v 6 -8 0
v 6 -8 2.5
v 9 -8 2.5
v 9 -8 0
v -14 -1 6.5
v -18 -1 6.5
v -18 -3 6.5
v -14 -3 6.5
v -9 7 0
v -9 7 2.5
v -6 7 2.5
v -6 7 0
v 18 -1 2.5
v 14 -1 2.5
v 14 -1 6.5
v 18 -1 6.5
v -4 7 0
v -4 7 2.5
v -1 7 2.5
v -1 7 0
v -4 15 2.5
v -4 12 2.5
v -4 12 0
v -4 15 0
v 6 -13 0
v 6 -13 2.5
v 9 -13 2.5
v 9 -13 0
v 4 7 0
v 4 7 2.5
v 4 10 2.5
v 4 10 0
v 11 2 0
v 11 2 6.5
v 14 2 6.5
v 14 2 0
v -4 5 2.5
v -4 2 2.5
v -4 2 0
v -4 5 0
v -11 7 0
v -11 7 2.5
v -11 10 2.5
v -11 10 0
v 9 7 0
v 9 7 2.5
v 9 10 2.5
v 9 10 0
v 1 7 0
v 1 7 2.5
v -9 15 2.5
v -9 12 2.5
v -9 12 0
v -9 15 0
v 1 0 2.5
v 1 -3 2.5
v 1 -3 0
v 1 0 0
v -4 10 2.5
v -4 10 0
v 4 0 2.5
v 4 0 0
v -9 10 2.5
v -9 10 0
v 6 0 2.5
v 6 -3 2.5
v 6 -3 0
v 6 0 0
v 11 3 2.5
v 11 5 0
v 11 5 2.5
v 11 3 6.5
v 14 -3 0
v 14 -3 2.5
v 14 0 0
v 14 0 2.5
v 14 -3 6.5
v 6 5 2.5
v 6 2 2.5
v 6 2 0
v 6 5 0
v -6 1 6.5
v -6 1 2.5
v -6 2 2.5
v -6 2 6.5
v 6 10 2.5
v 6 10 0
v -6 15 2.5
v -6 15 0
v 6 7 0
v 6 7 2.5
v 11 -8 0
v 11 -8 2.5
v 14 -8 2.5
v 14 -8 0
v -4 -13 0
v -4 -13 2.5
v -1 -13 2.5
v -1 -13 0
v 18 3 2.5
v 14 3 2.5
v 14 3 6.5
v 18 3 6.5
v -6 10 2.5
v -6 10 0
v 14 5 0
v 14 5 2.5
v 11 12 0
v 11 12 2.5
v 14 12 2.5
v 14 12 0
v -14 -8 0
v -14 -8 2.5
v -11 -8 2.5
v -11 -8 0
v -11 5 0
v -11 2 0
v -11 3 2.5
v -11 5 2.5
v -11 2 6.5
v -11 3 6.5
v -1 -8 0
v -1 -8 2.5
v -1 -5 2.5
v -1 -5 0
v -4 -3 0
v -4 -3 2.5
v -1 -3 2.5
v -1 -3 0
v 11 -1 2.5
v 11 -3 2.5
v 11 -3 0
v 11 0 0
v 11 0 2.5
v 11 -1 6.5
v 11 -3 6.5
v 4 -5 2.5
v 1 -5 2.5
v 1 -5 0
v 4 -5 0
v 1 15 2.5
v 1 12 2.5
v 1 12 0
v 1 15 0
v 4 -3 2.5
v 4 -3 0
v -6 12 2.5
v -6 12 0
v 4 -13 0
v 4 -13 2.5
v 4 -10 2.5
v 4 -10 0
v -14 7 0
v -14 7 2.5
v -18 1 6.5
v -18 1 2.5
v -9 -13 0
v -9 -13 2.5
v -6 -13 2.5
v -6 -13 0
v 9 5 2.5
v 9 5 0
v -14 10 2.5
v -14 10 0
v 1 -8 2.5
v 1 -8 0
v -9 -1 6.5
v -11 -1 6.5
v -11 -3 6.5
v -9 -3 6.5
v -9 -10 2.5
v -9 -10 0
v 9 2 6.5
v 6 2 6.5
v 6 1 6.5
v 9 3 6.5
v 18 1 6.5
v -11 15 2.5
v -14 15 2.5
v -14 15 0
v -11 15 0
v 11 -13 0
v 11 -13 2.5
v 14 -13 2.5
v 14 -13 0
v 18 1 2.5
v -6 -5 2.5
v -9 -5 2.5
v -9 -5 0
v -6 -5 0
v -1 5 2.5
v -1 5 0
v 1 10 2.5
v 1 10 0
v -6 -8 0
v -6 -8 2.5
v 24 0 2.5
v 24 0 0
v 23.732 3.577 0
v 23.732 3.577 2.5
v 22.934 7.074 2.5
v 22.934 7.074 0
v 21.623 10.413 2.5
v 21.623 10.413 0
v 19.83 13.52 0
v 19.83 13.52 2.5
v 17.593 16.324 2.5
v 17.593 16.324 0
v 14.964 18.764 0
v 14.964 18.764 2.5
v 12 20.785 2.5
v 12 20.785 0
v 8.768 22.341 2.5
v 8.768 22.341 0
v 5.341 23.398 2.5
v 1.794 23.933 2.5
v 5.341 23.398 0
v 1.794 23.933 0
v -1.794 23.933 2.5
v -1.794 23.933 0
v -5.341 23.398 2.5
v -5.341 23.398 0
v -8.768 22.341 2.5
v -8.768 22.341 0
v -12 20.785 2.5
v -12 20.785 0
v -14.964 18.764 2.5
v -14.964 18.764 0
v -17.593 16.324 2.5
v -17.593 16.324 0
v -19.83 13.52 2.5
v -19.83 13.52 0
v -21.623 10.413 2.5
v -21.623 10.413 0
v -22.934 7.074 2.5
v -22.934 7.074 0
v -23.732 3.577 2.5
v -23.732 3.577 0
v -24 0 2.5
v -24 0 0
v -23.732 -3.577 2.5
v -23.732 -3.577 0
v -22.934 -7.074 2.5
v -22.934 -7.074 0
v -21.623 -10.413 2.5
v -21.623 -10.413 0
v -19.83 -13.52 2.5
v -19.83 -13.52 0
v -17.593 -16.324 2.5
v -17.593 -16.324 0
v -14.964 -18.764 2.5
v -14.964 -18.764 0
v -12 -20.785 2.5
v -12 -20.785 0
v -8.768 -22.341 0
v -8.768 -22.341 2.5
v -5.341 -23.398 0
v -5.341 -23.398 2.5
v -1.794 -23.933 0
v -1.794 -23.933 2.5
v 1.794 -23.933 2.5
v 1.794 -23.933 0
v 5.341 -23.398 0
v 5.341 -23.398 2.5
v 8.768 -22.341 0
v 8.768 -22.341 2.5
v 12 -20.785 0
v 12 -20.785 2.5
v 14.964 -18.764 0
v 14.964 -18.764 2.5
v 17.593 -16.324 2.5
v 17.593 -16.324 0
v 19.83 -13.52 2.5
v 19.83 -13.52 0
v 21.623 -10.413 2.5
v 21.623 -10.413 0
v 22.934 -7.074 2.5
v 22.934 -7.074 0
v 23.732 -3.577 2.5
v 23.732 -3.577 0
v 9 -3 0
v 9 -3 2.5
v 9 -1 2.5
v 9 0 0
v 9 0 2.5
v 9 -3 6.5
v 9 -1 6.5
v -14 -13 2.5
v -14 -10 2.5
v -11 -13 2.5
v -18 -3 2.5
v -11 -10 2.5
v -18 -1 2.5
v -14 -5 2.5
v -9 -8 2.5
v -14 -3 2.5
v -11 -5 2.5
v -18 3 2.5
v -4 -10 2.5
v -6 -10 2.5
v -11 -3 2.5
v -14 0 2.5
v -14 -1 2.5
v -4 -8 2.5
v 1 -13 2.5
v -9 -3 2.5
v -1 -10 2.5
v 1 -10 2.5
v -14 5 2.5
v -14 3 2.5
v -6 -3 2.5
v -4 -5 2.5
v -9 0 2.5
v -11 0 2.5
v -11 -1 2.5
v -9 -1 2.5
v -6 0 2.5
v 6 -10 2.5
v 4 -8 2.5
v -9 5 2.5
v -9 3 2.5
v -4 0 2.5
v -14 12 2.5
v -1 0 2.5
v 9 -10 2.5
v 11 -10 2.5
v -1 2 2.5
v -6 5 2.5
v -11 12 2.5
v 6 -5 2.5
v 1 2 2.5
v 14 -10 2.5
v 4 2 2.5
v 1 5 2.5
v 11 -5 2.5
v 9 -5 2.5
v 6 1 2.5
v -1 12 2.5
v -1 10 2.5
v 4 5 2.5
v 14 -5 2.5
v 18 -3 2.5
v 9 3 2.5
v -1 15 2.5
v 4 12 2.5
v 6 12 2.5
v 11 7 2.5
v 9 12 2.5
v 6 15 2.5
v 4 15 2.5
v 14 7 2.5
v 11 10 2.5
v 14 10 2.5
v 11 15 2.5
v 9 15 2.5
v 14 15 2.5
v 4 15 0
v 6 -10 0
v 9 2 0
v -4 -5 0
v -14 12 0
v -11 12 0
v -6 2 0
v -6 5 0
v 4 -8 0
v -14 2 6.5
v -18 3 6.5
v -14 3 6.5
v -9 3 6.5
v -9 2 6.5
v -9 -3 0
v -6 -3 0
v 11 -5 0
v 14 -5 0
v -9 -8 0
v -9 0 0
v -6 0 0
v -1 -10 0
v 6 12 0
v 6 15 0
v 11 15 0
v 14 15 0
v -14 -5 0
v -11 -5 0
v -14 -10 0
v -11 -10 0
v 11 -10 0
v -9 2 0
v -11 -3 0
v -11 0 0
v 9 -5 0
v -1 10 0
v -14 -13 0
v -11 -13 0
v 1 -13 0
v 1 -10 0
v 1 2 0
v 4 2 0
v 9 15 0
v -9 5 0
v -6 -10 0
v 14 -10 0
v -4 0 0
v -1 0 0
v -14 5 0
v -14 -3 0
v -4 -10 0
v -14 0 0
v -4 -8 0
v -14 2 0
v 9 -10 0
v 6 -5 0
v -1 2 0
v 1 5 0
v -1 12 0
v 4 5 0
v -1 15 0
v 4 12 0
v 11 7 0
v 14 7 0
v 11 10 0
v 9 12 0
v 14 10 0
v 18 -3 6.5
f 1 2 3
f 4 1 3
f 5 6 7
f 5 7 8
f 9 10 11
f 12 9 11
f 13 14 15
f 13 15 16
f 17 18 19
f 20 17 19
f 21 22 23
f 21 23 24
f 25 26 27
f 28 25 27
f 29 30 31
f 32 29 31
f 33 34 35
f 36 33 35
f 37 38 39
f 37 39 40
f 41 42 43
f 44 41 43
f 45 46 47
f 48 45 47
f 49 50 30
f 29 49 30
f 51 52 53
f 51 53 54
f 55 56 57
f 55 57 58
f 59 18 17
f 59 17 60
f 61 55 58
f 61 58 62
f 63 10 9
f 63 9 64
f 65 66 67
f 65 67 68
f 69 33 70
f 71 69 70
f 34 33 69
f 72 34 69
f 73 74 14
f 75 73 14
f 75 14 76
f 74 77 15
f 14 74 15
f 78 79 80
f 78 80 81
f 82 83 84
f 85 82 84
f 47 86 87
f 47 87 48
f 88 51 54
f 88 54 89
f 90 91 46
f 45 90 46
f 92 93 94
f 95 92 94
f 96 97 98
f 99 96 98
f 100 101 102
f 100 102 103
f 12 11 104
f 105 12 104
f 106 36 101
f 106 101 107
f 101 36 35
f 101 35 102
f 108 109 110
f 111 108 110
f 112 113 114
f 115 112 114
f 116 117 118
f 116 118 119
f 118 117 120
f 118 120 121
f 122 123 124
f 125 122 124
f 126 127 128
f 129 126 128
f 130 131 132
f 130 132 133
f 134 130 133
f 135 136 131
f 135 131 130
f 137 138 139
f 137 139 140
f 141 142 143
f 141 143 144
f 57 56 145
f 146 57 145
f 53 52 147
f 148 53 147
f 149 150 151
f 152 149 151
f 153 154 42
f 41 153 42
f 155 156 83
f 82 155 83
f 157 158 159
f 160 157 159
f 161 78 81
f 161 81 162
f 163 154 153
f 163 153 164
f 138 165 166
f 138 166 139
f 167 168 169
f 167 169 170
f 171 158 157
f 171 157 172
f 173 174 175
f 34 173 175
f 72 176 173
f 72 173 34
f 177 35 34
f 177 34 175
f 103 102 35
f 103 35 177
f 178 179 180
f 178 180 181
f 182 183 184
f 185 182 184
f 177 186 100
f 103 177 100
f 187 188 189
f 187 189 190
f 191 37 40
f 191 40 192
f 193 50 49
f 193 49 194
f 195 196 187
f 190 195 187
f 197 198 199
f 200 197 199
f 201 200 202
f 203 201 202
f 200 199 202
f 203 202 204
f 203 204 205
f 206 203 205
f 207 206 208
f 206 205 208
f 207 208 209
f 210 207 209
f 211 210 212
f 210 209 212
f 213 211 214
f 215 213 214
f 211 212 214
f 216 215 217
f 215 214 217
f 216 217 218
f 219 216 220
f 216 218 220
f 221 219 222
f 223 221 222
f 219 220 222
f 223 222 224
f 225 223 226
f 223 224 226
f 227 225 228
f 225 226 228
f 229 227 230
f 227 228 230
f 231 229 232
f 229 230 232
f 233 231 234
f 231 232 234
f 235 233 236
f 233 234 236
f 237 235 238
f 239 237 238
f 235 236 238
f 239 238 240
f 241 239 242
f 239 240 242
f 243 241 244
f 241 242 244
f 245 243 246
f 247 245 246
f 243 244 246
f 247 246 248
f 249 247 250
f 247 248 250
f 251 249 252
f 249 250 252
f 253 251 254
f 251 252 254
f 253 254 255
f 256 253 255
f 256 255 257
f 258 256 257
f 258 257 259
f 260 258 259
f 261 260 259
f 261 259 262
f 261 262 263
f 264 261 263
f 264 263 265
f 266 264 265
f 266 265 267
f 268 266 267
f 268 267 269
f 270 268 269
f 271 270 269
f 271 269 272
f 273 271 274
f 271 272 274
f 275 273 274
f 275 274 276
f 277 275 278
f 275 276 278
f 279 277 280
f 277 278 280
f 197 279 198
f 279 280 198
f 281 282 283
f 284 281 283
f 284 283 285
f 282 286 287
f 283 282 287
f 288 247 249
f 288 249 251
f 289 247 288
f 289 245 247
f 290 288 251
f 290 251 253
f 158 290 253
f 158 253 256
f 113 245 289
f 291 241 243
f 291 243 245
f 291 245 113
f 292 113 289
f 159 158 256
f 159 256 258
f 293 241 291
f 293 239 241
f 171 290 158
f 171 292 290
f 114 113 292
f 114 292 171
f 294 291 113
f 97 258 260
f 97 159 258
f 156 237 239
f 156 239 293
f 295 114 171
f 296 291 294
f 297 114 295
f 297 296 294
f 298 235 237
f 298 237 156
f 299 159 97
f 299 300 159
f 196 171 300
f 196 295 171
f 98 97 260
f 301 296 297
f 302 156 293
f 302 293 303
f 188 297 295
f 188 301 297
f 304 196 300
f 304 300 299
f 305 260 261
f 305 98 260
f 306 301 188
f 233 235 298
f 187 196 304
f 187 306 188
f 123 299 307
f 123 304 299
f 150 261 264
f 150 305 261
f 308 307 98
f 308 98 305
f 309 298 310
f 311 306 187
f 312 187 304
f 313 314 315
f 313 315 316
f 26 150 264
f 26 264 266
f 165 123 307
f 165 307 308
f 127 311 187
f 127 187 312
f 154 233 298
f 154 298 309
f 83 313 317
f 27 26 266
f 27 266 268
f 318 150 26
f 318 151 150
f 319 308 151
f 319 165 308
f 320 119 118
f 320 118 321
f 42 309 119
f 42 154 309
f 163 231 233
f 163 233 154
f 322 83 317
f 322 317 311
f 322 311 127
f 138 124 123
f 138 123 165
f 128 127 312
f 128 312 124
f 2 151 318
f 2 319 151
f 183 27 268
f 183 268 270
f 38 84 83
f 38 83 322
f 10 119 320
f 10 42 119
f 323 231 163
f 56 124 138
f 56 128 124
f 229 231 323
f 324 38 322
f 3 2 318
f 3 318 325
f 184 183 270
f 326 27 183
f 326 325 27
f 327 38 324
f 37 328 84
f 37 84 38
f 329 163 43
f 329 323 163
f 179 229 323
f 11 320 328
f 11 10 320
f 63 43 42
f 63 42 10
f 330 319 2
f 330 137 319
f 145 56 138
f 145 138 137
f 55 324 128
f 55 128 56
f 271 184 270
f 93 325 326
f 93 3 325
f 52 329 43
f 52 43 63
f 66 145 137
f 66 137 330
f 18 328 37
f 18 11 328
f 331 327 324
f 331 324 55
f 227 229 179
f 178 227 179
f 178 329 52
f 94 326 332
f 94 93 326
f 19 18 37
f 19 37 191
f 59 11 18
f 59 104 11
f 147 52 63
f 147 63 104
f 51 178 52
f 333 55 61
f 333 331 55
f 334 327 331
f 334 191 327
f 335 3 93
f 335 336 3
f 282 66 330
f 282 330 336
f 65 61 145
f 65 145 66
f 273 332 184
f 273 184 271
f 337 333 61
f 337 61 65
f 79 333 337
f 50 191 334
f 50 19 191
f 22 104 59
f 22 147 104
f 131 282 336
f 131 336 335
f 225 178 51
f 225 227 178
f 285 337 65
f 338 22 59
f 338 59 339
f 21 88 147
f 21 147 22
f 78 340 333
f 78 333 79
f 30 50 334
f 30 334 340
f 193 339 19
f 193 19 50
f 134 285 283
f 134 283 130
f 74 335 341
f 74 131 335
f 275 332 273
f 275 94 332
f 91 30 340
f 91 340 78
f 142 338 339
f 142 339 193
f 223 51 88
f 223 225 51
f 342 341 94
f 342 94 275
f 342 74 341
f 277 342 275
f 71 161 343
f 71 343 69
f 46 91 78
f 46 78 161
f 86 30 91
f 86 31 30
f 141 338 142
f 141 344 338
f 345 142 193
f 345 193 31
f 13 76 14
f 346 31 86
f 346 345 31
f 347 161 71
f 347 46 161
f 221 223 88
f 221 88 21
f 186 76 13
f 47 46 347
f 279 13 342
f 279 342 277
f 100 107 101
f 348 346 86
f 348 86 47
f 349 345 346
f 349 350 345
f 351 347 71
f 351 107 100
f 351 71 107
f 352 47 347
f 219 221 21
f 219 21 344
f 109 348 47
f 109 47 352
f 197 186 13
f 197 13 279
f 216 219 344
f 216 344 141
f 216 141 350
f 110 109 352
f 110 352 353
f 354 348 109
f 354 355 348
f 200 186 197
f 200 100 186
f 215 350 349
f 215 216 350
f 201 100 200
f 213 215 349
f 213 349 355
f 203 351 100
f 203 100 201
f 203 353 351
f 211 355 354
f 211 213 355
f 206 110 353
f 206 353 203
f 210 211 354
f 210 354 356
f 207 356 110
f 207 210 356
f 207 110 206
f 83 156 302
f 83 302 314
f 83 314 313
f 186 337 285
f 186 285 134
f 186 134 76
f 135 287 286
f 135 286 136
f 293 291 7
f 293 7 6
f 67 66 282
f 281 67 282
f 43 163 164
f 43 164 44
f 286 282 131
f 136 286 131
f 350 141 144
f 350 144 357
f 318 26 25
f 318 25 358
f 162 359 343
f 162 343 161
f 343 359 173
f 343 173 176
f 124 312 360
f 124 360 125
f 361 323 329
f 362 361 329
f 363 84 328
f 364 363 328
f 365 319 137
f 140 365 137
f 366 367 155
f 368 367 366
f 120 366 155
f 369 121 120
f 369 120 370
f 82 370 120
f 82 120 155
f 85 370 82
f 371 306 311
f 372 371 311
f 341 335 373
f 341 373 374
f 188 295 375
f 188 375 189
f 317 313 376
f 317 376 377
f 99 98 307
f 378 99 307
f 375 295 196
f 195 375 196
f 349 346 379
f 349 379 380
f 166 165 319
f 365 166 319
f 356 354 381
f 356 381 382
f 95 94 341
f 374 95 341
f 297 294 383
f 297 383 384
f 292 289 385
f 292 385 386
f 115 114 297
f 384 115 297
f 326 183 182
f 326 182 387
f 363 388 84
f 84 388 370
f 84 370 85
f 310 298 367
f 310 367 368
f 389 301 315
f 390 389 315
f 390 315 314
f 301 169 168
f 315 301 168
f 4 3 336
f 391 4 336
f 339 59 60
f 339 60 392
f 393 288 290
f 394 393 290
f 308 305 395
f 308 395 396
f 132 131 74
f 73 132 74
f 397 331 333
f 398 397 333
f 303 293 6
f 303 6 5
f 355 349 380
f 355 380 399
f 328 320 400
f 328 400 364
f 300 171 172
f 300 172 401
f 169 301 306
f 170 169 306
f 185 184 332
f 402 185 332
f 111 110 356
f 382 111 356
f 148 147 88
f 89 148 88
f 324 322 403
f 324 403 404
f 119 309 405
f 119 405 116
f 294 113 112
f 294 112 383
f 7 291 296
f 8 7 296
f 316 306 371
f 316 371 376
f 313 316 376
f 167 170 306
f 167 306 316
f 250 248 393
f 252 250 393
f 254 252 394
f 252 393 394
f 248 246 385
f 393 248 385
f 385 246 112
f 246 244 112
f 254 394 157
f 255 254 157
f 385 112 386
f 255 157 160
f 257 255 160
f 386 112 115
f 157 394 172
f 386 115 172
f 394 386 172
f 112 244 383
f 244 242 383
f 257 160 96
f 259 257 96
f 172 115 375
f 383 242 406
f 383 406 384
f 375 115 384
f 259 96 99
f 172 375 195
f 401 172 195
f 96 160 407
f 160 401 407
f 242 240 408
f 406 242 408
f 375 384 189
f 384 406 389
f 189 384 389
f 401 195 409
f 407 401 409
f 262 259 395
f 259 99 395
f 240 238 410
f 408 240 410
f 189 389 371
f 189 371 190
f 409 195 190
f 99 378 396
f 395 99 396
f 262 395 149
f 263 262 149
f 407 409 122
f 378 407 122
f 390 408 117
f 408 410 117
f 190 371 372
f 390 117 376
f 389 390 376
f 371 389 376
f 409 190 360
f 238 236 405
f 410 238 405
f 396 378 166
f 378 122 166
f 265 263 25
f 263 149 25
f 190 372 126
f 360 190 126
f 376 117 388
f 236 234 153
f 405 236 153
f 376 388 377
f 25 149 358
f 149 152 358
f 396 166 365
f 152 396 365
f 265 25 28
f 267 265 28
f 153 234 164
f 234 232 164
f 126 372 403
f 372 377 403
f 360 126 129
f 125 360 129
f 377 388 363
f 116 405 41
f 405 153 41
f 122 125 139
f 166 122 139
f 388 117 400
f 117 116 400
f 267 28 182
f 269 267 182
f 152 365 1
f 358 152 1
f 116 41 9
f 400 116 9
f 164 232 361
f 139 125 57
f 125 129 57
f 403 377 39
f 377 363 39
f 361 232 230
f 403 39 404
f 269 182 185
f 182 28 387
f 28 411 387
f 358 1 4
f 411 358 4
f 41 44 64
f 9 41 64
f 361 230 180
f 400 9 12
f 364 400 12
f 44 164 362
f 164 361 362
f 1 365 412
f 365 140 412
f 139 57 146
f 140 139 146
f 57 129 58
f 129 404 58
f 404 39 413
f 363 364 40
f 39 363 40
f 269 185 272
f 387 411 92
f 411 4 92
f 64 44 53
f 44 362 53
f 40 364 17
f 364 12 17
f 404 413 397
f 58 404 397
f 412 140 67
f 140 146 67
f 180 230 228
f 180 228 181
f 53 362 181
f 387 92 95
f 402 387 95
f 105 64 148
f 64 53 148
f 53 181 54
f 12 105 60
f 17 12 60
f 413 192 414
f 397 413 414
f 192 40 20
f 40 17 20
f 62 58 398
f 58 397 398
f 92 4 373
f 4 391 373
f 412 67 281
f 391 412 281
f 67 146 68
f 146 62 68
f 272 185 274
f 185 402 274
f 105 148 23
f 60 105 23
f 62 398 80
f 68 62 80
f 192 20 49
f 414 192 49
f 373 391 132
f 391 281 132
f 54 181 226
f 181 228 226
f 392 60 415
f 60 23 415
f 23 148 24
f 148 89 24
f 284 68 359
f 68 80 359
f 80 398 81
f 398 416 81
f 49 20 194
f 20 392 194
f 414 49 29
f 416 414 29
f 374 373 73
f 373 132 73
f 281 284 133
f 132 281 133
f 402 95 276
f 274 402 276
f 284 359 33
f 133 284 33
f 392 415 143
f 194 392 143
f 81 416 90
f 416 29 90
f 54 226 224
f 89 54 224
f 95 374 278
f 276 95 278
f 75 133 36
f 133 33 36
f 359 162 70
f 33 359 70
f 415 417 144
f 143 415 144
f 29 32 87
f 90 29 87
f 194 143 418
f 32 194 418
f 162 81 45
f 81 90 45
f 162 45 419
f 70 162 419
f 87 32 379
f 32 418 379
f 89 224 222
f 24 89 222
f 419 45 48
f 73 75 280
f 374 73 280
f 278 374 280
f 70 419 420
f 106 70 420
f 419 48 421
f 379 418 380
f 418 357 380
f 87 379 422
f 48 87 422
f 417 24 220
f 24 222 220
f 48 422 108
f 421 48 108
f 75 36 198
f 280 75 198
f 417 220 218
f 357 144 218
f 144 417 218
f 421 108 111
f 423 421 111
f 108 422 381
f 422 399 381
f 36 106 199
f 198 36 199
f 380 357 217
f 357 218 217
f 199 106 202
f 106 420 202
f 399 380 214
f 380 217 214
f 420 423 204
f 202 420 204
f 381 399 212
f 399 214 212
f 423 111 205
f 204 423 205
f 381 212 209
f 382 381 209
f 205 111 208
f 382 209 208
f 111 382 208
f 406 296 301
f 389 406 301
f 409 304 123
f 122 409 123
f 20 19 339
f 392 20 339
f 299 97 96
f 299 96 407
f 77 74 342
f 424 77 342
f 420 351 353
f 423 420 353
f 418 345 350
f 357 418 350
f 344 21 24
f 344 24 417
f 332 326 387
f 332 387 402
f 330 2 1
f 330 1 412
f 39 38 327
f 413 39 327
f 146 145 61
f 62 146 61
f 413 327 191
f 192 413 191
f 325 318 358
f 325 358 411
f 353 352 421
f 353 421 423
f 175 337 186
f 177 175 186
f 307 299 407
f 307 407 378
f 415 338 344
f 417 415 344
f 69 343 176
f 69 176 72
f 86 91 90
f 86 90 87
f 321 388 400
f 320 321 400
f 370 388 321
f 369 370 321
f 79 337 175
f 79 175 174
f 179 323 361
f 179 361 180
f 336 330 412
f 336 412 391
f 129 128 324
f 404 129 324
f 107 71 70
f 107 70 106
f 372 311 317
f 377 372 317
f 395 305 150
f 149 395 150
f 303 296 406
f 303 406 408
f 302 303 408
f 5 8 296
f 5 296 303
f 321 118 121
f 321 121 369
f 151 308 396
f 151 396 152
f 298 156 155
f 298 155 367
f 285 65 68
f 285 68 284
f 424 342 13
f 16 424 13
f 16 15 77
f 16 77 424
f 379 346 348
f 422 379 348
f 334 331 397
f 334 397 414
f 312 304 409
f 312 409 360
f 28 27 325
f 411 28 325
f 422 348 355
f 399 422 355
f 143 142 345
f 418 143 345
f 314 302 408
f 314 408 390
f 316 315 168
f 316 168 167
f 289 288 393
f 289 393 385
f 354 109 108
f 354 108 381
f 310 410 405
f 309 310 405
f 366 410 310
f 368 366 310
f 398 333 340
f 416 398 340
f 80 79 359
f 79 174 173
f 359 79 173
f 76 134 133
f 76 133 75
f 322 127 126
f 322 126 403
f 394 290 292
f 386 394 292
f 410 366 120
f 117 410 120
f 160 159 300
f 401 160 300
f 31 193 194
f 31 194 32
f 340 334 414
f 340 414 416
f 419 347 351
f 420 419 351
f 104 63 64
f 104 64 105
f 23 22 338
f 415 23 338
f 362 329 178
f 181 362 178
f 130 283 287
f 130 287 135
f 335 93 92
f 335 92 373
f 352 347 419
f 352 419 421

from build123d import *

# Parameters (mm, degrees)
F0_R          = 24
F1_DEPTH      = 2.5
F4_W          = 12
F4_H          = 2
F5_DEPTH      = 4
F6_W          = 3
F6_H          = 3
F7_DEPTH      = 2.5
F7_DEPTH_BACK = 25


with BuildPart() as f1:
    # F0 (on Top) → F1 (new body)
    with BuildSketch(Plane.XY):
        Circle(F0_R)
    extrude(amount=F1_DEPTH)

    # F4 (on face) → F5 (join)
    with BuildSketch(Plane.XY.offset(2.5)):
        with Locations((12, -2)):
            Rectangle(F4_W, F4_H)
        with Locations((12, 2)):
            Rectangle(F4_W, F4_H)
        with Locations((-12, -2)):
            Rectangle(F4_W, F4_H)
        with Locations((-12, 2)):
            Rectangle(F4_W, F4_H)
    extrude(amount=F5_DEPTH)

    # F6 (on face) → F7 (cut, two sides)
    with BuildSketch(Plane.XY.offset(2.5)) as f7_sk:
        with Locations((12.5, -11.5)):
            Rectangle(F6_W, F6_H)
        with Locations((12.5, -6.5)):
            Rectangle(F6_W, F6_H)
        with Locations((12.5, -1.5)):
            Rectangle(F6_W, F6_H)
        with Locations((12.5, 3.5)):
            Rectangle(F6_W, F6_H)
        with Locations((12.5, 8.5)):
            Rectangle(F6_W, F6_H)
        with Locations((12.5, 13.5)):
            Rectangle(F6_W, F6_H)
        with Locations((7.5, -11.5)):
            Rectangle(F6_W, F6_H)
        with Locations((7.5, -6.5)):
            Rectangle(F6_W, F6_H)
        with Locations((7.5, -1.5)):
            Rectangle(F6_W, F6_H)
        with Locations((7.5, 3.5)):
            Rectangle(F6_W, F6_H)
        with Locations((7.5, 8.5)):
            Rectangle(F6_W, F6_H)
        with Locations((7.5, 13.5)):
            Rectangle(F6_W, F6_H)
        with Locations((2.5, -11.5)):
            Rectangle(F6_W, F6_H)
        with Locations((2.5, -6.5)):
            Rectangle(F6_W, F6_H)
        with Locations((2.5, -1.5)):
            Rectangle(F6_W, F6_H)
        with Locations((2.5, 3.5)):
            Rectangle(F6_W, F6_H)
        with Locations((2.5, 8.5)):
            Rectangle(F6_W, F6_H)
        with Locations((2.5, 13.5)):
            Rectangle(F6_W, F6_H)
        with Locations((-2.5, -11.5)):
            Rectangle(F6_W, F6_H)
        with Locations((-2.5, -6.5)):
            Rectangle(F6_W, F6_H)
        with Locations((-2.5, -1.5)):
            Rectangle(F6_W, F6_H)
        with Locations((-2.5, 3.5)):
            Rectangle(F6_W, F6_H)
        with Locations((-2.5, 8.5)):
            Rectangle(F6_W, F6_H)
        with Locations((-2.5, 13.5)):
            Rectangle(F6_W, F6_H)
        with Locations((-7.5, -11.5)):
            Rectangle(F6_W, F6_H)
        with Locations((-7.5, -6.5)):
            Rectangle(F6_W, F6_H)
        with Locations((-7.5, -1.5)):
            Rectangle(F6_W, F6_H)
        with Locations((-7.5, 3.5)):
            Rectangle(F6_W, F6_H)
        with Locations((-7.5, 8.5)):
            Rectangle(F6_W, F6_H)
        with Locations((-7.5, 13.5)):
            Rectangle(F6_W, F6_H)
        with Locations((-12.5, -11.5)):
            Rectangle(F6_W, F6_H)
        with Locations((-12.5, -6.5)):
            Rectangle(F6_W, F6_H)
        with Locations((-12.5, -1.5)):
            Rectangle(F6_W, F6_H)
        with Locations((-12.5, 3.5)):
            Rectangle(F6_W, F6_H)
        with Locations((-12.5, 8.5)):
            Rectangle(F6_W, F6_H)
        with Locations((-12.5, 13.5)):
            Rectangle(F6_W, F6_H)
    extrude(amount=-F7_DEPTH, mode=Mode.SUBTRACT)
    extrude(f7_sk.sketch, amount=F7_DEPTH_BACK, mode=Mode.SUBTRACT)


solid = f1.part
